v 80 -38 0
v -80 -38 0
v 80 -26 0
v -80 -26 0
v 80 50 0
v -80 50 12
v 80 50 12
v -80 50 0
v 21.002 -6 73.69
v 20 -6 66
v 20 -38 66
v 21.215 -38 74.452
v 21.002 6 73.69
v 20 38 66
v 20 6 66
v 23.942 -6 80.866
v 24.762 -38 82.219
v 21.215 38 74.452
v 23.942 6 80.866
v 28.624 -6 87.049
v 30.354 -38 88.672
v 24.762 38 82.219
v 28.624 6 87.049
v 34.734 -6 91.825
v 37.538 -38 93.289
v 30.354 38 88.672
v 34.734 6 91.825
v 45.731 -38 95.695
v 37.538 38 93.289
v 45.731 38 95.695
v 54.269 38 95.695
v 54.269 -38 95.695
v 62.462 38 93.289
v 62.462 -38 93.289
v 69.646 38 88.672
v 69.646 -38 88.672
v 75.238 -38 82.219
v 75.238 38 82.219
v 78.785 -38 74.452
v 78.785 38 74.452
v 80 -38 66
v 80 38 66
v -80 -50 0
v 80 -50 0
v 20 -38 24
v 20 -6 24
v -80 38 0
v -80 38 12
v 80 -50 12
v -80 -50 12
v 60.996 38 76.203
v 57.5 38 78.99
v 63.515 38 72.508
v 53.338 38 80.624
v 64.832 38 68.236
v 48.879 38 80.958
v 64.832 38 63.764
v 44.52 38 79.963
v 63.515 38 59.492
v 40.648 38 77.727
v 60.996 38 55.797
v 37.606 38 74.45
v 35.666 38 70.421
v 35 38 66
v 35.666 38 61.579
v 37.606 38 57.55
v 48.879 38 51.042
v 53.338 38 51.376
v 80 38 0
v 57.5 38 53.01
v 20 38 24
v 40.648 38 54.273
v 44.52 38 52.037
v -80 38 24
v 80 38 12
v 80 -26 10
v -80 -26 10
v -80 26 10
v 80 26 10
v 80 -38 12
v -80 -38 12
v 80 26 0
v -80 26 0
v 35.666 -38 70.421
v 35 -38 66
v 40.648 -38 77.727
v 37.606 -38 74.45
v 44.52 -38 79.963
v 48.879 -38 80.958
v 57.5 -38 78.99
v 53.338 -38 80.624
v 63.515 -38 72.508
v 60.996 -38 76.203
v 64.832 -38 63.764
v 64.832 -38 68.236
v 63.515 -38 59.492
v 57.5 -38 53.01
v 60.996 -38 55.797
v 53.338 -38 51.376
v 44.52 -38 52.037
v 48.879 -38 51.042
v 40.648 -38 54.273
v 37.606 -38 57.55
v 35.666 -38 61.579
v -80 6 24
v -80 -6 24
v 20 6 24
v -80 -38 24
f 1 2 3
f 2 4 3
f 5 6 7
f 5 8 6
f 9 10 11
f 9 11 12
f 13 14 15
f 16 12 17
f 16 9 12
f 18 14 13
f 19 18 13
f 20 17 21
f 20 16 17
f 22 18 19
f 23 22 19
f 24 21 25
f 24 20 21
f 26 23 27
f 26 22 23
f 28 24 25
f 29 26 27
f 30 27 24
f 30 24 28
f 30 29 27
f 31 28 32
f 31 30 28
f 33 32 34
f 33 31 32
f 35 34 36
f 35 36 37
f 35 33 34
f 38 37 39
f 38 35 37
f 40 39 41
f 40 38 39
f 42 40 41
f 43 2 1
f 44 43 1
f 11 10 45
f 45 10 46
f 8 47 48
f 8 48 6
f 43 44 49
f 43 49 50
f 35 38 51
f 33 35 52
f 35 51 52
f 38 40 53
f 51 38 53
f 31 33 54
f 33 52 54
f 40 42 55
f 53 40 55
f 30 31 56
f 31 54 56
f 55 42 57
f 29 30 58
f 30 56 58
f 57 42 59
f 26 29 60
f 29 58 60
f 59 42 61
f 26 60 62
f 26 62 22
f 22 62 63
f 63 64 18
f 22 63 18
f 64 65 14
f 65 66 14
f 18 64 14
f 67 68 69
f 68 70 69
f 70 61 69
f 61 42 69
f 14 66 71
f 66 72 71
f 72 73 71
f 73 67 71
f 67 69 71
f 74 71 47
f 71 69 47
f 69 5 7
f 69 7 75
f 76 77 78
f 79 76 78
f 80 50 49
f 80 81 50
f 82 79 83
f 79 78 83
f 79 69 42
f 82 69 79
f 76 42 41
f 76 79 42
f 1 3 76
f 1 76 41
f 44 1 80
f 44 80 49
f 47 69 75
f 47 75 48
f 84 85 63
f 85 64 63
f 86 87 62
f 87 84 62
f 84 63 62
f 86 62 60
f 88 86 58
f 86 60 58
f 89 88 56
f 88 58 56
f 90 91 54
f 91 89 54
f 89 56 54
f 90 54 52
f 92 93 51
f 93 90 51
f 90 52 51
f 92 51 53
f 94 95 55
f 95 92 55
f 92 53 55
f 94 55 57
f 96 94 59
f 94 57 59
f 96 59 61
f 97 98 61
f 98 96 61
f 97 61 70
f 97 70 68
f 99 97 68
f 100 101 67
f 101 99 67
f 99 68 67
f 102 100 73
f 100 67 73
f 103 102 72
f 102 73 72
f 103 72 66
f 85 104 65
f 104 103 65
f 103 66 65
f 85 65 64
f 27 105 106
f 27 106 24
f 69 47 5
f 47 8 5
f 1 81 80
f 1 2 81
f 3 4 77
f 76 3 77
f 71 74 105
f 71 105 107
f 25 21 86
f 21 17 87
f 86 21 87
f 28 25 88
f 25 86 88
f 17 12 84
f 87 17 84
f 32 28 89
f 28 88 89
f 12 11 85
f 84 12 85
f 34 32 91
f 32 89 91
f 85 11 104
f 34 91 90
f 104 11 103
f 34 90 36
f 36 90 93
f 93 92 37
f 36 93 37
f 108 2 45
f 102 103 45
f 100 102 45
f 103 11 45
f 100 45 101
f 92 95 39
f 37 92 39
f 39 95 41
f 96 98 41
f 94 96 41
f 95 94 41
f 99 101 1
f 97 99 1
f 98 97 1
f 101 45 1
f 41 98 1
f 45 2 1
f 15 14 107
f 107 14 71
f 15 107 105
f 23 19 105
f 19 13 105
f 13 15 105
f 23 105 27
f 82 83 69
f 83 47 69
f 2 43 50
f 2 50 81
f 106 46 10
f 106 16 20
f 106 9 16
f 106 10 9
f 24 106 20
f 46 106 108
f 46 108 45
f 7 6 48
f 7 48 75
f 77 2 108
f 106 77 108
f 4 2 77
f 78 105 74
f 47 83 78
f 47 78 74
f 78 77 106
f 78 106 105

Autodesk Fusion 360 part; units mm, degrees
sketch "Sketch1" plane through (0, 0, 0) normal (0, 0, 1) x (1, 0, 0)
  line L0 (80, -50) -> (-80, -50)
  line L1 (-80, -50) -> (-80, 50)
  line L2 (-80, 50) -> (80, 50)
  line L3 (80, 50) -> (80, -50)
  line L4 (80, -50) -> (-80, 50) construction
  line L5 (-80, -50) -> (80, 50) construction
  line L6 (80, 38) -> (-80, 38)
  line L7 (-80, 38) -> (-80, -38)
  line L8 (-80, -38) -> (80, -38)
  line L9 (80, -38) -> (80, 38)
  line L10 (80, 38) -> (-80, -38) construction
  line L11 (-80, 38) -> (80, -38) construction
  dimension "d1" = 160
  dimension "d2" = 100
  dimension "d3" = 160
  dimension "d4" = 76
extrude "Extrude1" add sketch "Sketch1" along normal blind 12 contours L0 L1 L3 L8 | L1 L2 L3 L6 makes body 1 at (26.6667, 38, 4) makes body 2 at (26.6667, -50, 4)
extrude "Extrude2" add sketch "Sketch1" along normal blind 24 separate body contours L1 L3 L6 L7 L8 L9 makes body 3
sketch "Sketch2" plane through (-80, 0, 0) normal (-1, 0, 0) x (0, -1, 0)
  line L0 (-38, 0) -> (38, 0)
  line L1 (38, 0) -> (38, 24)
  line L2 (38, 24) -> (-38, 24)
  line L3 (-38, 24) -> (-38, 0)
  line L4 (26, 10) -> (-26, 10)
  line L5 (-26, 10) -> (-26, -10)
  line L6 (-26, -10) -> (26, -10)
  line L7 (26, -10) -> (26, 10)
  line L8 (26, 10) -> (-26, -10) construction
  line L9 (-26, 10) -> (26, -10) construction
  dimension "d9" = 52
  dimension "d10" = 20
extrude "Extrude3" cut sketch "Sketch2" against normal up to surface (160 mm away) contours L0 L4 L5 L7 bodies 3
ref_plane "WorkPlane1" through (0, 0, 6) normal (0, -1, 0) x (1, 0, 0)
sketch "Sketch3" plane through (0, 0, 0) normal (0, -1, 0) x (-1, 0, 0)
  line L0 (-80, -24) -> (-50, -24) construction
  line L1 (-50, -24) -> (-50, -66) construction
  circle A0 centre (-50, -66) radius 15
  line L2 (-80, -66) -> (-80, -24)
  line L3 (-20, -66) -> (-20, -24)
  line L4 (80, -24) -> (-34.7335, -91.825)
  line L5 (80, -24) -> (-80, -24)
  arc A1 (-80, -66) -> (-20, -66) centre (-50, -66) ccw
  point P0 (80, -24)
  point P1 (-80, -24)
  dimension "d13" = 30
  dimension "d14" = 42
  dimension "d15" = 60
  dimension "d16" = 30
extrude "Extrude4" add sketch "Sketch3" along normal mid plane 76 contours L2 L3 L5 A1 bodies 3
extrude "Extrude5" add sketch "Sketch3" along normal mid plane 12 contours L3 L4 L5 A1 bodies 3
